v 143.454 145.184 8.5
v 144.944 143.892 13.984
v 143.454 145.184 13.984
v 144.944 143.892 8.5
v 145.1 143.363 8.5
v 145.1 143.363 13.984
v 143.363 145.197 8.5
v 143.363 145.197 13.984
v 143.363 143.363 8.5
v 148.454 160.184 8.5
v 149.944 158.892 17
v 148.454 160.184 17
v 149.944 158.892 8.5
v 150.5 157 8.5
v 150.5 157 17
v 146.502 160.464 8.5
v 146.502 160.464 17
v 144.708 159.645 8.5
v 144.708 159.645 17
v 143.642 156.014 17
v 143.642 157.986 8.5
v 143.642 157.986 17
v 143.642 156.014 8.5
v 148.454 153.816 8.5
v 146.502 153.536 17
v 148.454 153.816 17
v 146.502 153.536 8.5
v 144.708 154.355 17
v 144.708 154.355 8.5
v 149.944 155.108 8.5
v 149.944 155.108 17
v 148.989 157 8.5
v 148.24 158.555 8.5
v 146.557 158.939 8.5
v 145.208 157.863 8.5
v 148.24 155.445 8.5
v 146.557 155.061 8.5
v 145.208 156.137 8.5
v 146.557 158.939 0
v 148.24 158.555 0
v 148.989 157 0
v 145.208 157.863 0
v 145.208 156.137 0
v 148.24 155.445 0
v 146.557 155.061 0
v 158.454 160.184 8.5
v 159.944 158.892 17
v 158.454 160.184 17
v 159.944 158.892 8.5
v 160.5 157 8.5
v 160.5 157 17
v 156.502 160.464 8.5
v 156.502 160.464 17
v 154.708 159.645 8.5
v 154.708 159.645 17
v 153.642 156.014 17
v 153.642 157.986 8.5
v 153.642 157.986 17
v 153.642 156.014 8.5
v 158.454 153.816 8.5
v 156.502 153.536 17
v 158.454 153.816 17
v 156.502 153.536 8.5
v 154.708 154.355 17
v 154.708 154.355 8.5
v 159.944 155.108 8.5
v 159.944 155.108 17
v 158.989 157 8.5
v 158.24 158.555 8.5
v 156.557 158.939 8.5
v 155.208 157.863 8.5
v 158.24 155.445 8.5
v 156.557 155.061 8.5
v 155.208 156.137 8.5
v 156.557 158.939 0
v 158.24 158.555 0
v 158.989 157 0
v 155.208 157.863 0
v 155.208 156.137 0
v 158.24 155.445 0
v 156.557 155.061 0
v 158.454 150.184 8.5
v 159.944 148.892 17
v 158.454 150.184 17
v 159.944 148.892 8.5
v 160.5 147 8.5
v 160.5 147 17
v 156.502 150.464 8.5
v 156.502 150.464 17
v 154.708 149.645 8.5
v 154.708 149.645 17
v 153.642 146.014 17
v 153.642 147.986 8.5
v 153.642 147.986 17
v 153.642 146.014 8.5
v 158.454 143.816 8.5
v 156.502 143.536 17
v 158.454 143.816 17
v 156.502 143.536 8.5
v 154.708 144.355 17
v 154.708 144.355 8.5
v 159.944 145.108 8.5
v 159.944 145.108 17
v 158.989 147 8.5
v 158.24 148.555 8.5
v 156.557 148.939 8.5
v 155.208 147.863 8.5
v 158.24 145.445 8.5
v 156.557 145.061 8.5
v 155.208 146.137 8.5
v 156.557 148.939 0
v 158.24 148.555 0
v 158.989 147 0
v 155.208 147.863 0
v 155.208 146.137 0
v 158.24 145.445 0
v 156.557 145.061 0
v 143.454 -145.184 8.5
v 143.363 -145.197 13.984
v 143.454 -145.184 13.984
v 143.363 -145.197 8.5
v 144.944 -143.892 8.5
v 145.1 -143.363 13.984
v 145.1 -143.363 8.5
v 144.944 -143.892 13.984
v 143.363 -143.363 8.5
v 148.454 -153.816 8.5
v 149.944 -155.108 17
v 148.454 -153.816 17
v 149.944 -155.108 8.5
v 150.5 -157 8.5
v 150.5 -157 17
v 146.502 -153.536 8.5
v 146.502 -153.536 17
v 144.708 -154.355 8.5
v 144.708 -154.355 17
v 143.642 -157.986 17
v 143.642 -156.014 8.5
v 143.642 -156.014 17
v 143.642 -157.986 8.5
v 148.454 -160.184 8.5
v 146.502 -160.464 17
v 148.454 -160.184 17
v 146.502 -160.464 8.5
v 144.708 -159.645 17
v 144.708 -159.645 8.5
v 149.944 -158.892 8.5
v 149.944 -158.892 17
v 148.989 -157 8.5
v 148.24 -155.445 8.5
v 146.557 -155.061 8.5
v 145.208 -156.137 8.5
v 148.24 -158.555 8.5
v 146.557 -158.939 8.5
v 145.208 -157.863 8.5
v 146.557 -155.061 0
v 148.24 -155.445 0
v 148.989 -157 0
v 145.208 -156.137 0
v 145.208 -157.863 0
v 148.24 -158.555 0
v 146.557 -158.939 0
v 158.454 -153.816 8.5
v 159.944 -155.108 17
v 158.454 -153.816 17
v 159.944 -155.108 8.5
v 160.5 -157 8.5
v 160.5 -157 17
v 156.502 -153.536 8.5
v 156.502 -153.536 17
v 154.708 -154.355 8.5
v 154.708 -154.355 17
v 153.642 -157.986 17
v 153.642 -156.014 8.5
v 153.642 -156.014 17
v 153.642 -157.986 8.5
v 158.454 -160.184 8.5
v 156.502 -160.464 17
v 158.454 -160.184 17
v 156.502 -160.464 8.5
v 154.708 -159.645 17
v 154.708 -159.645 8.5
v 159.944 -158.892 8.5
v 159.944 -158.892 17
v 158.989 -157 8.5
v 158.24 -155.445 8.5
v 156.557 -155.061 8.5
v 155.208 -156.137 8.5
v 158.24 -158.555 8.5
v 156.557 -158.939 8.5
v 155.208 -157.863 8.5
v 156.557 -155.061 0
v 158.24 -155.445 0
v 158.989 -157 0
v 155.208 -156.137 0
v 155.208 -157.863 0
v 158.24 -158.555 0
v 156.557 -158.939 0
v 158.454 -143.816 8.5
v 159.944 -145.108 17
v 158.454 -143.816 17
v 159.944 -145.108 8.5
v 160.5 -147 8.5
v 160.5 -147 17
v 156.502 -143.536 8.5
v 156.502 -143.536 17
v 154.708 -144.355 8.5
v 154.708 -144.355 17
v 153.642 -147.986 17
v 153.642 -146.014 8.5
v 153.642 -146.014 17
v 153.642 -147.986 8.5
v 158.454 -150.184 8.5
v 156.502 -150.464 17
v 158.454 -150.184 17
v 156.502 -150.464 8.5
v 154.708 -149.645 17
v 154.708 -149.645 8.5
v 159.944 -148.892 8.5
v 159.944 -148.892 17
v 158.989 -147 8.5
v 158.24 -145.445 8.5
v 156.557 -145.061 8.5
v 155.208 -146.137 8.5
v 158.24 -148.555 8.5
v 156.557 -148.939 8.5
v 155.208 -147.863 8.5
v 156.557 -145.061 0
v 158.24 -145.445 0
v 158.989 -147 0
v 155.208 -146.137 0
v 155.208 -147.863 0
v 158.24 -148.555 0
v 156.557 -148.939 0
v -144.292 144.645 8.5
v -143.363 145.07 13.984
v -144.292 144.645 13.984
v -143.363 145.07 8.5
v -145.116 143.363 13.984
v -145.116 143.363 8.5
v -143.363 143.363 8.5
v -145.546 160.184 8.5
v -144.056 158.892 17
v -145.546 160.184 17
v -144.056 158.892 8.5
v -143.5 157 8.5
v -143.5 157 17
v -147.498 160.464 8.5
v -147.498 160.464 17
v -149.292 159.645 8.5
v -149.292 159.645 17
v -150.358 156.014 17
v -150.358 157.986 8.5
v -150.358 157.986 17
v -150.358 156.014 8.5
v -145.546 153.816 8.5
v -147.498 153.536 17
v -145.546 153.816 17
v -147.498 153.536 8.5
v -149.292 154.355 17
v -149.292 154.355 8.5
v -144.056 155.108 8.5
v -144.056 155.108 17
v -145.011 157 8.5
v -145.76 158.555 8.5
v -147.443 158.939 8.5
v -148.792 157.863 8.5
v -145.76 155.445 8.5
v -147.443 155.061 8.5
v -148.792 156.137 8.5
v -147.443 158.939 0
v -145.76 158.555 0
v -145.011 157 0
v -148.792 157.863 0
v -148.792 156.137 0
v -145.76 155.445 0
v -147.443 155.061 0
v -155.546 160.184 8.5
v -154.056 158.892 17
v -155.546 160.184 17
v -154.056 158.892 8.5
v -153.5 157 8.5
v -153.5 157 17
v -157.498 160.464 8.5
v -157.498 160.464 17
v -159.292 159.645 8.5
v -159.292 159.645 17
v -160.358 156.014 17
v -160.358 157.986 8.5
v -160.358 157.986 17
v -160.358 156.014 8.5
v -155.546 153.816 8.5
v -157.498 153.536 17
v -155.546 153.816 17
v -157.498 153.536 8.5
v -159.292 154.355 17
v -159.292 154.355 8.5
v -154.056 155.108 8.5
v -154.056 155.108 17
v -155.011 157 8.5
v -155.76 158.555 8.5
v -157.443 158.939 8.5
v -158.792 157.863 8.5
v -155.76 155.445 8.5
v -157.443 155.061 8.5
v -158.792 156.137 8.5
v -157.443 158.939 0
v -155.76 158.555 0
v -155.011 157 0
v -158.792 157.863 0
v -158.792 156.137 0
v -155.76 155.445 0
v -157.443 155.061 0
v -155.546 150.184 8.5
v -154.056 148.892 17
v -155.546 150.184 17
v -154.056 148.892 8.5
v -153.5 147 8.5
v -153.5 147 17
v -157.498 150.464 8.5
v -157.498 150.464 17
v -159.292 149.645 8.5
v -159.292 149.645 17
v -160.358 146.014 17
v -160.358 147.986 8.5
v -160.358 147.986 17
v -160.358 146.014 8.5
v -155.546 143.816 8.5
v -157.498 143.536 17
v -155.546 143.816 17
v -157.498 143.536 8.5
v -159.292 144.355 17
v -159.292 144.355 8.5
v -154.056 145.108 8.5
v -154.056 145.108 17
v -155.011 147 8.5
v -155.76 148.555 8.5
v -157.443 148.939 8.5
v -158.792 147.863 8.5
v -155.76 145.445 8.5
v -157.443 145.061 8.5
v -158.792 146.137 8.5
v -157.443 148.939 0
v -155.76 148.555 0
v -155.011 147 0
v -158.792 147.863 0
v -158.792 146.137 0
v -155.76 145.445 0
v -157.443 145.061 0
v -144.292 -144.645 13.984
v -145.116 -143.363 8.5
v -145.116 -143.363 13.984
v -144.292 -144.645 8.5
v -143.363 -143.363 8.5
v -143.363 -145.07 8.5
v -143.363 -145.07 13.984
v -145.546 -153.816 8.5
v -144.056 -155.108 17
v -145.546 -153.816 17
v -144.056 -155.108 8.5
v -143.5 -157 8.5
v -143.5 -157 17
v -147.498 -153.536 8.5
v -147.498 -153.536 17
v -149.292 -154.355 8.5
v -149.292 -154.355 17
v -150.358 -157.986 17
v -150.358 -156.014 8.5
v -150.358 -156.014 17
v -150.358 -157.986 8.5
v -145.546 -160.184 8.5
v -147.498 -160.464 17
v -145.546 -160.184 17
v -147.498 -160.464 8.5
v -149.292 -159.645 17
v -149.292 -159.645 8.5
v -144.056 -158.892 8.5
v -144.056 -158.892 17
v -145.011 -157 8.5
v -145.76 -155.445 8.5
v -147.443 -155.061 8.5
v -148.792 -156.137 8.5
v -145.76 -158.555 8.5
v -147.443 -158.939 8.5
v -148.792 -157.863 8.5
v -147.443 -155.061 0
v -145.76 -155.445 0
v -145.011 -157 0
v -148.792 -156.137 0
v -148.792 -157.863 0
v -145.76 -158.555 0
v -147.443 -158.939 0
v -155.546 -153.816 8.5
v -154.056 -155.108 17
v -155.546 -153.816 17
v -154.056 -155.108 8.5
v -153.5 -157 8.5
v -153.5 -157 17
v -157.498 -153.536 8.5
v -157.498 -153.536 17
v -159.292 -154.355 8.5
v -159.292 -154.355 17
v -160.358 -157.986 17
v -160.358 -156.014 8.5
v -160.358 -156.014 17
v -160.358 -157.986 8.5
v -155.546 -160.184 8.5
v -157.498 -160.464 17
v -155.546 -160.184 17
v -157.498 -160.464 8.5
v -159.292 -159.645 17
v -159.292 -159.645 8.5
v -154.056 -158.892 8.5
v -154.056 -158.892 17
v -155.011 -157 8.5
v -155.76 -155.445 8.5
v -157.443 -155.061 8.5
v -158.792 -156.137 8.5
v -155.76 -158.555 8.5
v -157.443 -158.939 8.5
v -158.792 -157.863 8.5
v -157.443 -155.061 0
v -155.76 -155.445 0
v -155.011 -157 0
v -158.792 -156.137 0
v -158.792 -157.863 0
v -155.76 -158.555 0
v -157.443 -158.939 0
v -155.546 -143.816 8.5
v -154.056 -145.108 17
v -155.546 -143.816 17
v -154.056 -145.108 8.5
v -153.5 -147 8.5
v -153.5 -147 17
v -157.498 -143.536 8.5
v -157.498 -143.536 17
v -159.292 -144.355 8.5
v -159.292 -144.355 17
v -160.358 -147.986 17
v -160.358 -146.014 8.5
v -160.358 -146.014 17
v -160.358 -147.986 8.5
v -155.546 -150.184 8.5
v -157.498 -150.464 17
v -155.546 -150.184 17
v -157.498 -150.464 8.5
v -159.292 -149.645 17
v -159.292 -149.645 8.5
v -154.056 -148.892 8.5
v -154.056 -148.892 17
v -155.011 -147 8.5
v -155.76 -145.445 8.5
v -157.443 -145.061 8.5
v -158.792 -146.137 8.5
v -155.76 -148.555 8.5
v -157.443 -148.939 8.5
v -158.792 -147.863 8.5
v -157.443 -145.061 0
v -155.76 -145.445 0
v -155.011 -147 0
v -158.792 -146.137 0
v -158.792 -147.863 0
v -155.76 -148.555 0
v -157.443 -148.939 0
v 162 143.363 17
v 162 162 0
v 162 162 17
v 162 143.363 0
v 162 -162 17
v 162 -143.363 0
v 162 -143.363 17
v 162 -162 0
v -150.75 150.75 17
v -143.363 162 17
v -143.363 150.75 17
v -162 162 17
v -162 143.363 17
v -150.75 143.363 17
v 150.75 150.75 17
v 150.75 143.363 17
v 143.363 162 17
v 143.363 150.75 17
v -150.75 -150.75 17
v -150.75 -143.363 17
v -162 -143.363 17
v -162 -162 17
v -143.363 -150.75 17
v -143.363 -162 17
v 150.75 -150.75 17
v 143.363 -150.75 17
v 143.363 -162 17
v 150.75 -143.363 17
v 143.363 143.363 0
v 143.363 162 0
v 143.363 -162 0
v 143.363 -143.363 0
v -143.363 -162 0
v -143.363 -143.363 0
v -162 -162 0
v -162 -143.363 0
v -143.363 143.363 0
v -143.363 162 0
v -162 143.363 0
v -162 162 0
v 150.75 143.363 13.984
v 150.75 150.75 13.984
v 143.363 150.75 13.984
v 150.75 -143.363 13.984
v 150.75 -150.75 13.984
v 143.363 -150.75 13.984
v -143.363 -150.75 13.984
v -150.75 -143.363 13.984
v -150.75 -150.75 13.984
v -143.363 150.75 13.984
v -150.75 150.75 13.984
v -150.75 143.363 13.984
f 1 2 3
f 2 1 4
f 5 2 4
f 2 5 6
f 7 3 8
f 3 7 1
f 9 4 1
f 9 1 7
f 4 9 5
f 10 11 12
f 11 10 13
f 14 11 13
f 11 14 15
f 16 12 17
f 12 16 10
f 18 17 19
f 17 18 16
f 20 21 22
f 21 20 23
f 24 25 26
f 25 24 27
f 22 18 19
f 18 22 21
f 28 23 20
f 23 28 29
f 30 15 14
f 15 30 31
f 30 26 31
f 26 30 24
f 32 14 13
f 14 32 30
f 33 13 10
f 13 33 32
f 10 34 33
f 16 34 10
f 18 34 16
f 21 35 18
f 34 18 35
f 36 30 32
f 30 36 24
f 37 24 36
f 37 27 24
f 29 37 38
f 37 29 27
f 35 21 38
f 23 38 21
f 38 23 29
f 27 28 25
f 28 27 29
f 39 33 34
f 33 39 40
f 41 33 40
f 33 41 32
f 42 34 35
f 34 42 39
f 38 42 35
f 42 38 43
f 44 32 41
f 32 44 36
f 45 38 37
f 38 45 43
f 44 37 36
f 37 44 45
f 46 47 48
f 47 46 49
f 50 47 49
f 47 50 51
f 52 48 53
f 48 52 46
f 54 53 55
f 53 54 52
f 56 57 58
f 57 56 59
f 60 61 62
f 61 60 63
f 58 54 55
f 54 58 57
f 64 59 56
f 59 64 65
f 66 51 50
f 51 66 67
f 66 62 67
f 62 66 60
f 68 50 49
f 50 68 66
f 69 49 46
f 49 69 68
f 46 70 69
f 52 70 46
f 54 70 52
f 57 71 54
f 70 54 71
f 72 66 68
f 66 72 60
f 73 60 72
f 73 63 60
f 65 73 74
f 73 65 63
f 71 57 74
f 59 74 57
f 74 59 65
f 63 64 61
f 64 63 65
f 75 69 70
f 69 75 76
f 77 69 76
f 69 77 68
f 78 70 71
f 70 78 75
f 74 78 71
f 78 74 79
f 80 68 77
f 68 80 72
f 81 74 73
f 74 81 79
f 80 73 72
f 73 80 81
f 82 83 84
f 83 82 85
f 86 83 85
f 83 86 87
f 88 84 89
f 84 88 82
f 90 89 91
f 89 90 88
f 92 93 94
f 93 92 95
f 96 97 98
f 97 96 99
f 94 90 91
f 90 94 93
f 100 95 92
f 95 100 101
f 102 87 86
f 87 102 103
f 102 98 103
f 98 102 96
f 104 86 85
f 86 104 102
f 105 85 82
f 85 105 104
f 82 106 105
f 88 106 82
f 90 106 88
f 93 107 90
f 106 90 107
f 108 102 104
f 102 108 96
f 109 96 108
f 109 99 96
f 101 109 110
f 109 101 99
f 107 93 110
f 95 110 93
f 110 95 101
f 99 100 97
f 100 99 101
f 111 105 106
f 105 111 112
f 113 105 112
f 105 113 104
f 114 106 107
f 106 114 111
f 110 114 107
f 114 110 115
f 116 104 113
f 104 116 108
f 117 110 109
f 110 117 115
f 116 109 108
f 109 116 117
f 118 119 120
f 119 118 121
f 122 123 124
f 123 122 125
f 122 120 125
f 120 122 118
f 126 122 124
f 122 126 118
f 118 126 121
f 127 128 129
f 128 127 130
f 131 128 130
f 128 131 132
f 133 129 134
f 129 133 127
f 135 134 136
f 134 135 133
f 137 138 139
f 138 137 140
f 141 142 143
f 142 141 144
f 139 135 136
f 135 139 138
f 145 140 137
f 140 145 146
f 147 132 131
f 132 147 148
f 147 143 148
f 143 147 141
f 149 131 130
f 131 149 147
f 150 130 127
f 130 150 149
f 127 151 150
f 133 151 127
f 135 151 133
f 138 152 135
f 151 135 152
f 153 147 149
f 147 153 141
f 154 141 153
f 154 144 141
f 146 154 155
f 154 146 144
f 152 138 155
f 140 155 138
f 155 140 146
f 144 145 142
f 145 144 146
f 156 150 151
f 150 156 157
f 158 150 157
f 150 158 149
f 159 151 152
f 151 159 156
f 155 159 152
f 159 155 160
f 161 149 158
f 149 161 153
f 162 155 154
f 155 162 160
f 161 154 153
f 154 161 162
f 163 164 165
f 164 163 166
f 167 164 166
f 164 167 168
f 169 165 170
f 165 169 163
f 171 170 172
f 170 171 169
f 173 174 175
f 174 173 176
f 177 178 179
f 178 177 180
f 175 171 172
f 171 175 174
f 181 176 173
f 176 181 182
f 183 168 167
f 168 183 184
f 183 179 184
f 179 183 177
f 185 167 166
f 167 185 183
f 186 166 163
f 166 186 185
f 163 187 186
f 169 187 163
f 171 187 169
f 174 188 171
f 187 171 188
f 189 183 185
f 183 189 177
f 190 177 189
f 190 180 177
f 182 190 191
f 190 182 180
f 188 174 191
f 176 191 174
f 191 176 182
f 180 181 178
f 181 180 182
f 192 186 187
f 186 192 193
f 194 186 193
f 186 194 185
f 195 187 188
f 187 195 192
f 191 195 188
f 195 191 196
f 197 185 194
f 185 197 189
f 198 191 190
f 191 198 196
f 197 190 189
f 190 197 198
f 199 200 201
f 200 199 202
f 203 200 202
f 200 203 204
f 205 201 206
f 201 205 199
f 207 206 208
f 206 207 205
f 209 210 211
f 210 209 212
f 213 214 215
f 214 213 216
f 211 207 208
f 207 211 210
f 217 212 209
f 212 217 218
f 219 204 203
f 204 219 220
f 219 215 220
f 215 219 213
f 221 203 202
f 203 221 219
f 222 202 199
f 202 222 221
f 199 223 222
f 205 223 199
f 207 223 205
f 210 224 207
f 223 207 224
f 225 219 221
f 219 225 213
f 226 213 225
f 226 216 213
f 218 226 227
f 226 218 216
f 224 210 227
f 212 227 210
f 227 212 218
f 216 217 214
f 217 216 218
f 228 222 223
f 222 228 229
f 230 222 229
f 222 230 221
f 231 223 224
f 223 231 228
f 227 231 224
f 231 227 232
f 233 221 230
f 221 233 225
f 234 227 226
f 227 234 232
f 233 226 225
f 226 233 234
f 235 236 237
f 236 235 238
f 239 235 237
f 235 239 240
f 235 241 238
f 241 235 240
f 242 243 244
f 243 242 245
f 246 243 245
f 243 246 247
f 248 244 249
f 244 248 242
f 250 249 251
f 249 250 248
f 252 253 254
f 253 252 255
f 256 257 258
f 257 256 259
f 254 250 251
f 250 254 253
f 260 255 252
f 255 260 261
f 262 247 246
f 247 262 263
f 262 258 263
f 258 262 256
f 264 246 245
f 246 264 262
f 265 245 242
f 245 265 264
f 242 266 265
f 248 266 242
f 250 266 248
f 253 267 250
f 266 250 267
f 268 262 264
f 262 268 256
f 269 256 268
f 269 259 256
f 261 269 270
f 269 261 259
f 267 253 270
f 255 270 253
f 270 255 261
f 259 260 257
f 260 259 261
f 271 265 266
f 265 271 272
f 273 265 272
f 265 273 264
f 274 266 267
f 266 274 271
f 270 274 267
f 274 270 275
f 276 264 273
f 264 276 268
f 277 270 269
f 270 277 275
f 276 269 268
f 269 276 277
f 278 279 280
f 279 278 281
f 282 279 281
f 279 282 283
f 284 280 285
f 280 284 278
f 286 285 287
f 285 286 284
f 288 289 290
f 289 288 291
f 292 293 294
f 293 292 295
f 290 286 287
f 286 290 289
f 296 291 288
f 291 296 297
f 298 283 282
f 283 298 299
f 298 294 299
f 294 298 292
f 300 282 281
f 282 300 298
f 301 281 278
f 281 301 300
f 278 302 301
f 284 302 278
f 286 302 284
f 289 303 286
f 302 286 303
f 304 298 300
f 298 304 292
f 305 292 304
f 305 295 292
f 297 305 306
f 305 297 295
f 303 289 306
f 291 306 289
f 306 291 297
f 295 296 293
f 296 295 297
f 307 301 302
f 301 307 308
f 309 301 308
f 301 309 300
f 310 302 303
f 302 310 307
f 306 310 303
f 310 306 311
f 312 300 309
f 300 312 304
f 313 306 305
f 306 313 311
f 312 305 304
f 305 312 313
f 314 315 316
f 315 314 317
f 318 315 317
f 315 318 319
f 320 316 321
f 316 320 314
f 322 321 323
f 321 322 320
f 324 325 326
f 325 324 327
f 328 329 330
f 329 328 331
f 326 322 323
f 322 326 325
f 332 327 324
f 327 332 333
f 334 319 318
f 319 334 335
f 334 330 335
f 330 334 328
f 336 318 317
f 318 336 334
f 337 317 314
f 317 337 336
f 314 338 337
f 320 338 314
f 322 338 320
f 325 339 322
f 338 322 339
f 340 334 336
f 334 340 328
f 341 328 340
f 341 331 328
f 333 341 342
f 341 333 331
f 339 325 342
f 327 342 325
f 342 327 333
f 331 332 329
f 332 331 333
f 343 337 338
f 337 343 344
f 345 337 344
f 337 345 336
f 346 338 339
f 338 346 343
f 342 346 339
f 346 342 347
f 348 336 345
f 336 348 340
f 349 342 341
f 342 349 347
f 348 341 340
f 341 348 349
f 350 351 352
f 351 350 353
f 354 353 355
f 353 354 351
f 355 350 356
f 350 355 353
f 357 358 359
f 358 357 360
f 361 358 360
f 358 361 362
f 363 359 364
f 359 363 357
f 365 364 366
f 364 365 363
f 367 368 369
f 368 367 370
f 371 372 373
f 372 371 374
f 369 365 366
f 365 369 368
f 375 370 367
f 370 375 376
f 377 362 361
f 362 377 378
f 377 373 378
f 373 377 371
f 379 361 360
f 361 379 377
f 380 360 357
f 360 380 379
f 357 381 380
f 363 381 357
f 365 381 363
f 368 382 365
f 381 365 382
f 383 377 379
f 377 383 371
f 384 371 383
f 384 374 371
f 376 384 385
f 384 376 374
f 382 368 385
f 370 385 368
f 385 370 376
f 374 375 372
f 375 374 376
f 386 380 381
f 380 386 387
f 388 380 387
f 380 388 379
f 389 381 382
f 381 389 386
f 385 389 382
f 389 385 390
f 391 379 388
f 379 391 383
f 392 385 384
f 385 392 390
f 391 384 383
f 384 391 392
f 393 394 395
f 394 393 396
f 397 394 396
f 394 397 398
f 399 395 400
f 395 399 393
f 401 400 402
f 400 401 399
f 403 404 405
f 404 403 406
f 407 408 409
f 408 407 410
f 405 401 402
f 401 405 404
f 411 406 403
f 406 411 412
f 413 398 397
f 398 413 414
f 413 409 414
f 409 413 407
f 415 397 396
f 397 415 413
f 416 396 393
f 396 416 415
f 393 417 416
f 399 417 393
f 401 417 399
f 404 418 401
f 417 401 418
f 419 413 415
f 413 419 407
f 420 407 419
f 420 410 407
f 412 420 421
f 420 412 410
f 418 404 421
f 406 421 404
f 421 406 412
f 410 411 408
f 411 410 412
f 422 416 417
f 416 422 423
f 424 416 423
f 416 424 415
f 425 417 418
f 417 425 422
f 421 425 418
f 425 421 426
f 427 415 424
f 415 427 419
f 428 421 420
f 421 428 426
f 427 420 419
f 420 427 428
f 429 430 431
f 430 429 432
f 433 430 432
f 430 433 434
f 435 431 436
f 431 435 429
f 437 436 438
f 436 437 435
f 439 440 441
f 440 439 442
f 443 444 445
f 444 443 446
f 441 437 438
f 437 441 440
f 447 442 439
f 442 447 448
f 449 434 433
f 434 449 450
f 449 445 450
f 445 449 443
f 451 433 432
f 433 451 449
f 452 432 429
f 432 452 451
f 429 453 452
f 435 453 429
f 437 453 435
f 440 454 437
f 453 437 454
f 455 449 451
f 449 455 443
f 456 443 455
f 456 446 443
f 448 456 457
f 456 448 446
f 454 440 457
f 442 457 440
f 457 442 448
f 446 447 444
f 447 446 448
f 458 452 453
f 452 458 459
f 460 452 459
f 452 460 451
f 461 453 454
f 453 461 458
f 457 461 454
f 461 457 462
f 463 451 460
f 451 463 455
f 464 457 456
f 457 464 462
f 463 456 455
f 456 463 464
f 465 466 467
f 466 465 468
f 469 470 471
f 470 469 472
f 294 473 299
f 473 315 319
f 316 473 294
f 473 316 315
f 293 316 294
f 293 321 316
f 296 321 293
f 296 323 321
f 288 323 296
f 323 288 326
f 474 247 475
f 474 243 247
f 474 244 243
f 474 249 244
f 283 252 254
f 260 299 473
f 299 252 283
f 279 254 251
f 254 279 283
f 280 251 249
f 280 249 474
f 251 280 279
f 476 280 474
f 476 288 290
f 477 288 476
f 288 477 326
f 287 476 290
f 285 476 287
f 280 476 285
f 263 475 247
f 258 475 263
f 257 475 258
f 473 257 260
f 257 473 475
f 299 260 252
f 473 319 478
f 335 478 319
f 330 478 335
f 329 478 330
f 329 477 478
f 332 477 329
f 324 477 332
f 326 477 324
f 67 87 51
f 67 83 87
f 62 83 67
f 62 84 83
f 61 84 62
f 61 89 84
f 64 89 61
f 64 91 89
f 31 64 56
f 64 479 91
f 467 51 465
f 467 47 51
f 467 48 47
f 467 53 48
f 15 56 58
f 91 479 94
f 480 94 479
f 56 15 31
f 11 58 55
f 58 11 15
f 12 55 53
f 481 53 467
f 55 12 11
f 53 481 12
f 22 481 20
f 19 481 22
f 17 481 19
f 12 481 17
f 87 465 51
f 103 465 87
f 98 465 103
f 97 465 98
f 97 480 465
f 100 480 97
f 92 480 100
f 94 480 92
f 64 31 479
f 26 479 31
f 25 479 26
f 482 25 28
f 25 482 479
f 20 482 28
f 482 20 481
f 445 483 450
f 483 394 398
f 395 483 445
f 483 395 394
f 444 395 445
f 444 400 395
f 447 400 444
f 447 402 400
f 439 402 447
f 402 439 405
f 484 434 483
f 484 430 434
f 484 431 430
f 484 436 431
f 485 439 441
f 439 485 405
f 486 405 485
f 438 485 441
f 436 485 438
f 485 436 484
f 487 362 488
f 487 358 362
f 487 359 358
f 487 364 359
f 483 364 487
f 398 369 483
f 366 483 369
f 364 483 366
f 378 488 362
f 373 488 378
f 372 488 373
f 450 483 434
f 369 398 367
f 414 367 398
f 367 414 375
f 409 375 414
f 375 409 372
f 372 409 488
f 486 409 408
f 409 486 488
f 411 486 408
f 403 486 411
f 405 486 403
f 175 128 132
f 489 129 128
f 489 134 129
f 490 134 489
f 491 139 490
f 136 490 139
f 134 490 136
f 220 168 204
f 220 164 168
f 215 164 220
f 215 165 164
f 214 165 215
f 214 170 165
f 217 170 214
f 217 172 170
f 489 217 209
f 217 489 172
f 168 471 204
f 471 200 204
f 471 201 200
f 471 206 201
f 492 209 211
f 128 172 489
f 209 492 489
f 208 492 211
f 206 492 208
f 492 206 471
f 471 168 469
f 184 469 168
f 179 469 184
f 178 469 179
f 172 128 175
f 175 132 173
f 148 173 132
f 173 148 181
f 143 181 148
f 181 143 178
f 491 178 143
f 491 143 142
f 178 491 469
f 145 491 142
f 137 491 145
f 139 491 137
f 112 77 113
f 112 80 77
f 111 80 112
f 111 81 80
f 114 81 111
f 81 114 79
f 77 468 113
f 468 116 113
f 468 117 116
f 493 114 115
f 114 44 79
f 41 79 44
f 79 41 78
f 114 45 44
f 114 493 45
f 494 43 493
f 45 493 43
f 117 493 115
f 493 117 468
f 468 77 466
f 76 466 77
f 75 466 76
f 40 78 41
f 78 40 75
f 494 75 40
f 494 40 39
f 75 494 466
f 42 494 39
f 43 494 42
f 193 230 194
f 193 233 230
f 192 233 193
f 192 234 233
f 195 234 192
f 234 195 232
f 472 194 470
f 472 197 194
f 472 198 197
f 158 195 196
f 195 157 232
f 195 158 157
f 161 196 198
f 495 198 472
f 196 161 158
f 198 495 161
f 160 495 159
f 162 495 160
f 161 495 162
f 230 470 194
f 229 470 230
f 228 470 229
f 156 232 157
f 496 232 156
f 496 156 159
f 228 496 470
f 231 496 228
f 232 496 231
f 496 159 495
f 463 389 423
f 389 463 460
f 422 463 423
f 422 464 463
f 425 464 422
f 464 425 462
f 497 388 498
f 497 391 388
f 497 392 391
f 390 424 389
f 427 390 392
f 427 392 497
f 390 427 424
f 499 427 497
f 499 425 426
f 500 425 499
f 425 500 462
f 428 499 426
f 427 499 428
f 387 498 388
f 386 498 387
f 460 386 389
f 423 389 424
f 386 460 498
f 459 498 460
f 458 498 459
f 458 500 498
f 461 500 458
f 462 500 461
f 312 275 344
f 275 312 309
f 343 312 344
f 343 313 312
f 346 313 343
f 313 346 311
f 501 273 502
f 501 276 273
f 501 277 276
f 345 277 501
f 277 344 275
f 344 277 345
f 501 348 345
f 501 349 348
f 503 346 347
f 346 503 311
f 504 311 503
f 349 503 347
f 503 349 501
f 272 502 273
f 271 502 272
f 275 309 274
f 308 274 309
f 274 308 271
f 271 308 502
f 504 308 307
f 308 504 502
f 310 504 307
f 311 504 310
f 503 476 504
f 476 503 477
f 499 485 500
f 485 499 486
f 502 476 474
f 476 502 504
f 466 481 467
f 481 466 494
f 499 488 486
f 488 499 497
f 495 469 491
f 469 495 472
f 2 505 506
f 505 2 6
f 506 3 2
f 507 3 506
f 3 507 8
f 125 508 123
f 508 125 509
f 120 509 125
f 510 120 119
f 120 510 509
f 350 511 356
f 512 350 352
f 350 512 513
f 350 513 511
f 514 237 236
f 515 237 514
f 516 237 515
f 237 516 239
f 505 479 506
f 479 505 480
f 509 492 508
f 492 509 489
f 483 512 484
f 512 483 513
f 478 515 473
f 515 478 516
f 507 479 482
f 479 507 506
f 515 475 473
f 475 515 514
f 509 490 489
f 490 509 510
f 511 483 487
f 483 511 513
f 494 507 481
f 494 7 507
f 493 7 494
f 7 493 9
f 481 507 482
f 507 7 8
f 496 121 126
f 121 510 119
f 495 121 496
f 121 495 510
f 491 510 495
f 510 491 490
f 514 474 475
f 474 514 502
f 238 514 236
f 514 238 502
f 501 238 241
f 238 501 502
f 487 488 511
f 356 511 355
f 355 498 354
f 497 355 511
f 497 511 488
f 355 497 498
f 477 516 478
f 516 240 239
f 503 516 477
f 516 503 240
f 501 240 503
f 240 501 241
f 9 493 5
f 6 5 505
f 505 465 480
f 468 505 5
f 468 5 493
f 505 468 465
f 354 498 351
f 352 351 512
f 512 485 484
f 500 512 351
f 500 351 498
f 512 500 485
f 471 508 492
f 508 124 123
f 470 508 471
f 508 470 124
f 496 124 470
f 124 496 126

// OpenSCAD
use<MCAD/nuts_and_bolts.scad>
holes = [[142,142],[147,157],[157,157],[157,147] ];



//spreader=[0.4+12*25.4,0.4+9*25.4,3];
spreader=[0,0,0];
glass=[1.5+300,1.5+300,3.08];
cork=[12*25.4,12*25.4,3];
screws_offset=(5/64)*25.4 + 3;
heater=[225,225,1];
cork_plane = [cork[0],cork[1],cork[2]+screws_offset];

*color("red")translate([0,0,heater[2]/2 + cork_plane[2]])cube(heater,center=true);
*color("blue")translate([0,0,heater[2]+spreader[2]/2 + cork_plane[2]])cube(spreader,center=true);
    *color("yellow")translate([0,0,heater[2]+glass[2]/2+ spreader[2] + cork_plane[2]])cube(glass,center=true);

shift = 5;
bracket = [162*2,162*2,12+shift];
cutout=1.13 ;
// corner mounting holes
difference() {
  translate([0,0,bracket[2]/2])cube(bracket,center=true);

  scale([1,1,bracket[2]/shift])
    for (k = [1,-1])
      for (j = [1,-1]) 
        for (i = holes) {
          mirror([0,0,1])translate([k*i[0],j*i[1],-bracket[2]+shift+9.5])boltHole(size=4, length=bracket[2]);
          mirror([0,0,1])translate([k*i[0],j*i[1],-bracket[2]+shift+7])boltHole(size=4, length=bracket[2]);
          mirror([0,0,1])translate([k*i[0],j*i[1],-bracket[2]+shift+5])boltHole(size=4, length=bracket[2]);
          mirror([0,0,1])translate([k*i[0],j*i[1],-bracket[2]+shift+3])boltHole(size=4, length=bracket[2]);
          //      *cylinder(r=3.2/2, h=bracket[2]+5);
        }
  color("red")translate([0,0,heater[2]/2 + shift+ cork_plane[2]])cube(heater,center=true);
  color("blue")translate([0,0,heater[2]+shift+spreader[2]/2 + cork_plane[2]])cube(spreader,center=true);
  color("yellow")translate([0,0,heater[2]+shift+glass[2]/2+ spreader[2] + cork_plane[2]])cube(glass,center=true);
  color("green") translate([0,0,bracket[2]/2])cube([bracket[0]/cutout,bracket[1],bracket[2]],center=true);
  color("green") translate([0,0,bracket[2]/2])cube([bracket[0],bracket[1]/cutout,bracket[2]],center=true);

}
